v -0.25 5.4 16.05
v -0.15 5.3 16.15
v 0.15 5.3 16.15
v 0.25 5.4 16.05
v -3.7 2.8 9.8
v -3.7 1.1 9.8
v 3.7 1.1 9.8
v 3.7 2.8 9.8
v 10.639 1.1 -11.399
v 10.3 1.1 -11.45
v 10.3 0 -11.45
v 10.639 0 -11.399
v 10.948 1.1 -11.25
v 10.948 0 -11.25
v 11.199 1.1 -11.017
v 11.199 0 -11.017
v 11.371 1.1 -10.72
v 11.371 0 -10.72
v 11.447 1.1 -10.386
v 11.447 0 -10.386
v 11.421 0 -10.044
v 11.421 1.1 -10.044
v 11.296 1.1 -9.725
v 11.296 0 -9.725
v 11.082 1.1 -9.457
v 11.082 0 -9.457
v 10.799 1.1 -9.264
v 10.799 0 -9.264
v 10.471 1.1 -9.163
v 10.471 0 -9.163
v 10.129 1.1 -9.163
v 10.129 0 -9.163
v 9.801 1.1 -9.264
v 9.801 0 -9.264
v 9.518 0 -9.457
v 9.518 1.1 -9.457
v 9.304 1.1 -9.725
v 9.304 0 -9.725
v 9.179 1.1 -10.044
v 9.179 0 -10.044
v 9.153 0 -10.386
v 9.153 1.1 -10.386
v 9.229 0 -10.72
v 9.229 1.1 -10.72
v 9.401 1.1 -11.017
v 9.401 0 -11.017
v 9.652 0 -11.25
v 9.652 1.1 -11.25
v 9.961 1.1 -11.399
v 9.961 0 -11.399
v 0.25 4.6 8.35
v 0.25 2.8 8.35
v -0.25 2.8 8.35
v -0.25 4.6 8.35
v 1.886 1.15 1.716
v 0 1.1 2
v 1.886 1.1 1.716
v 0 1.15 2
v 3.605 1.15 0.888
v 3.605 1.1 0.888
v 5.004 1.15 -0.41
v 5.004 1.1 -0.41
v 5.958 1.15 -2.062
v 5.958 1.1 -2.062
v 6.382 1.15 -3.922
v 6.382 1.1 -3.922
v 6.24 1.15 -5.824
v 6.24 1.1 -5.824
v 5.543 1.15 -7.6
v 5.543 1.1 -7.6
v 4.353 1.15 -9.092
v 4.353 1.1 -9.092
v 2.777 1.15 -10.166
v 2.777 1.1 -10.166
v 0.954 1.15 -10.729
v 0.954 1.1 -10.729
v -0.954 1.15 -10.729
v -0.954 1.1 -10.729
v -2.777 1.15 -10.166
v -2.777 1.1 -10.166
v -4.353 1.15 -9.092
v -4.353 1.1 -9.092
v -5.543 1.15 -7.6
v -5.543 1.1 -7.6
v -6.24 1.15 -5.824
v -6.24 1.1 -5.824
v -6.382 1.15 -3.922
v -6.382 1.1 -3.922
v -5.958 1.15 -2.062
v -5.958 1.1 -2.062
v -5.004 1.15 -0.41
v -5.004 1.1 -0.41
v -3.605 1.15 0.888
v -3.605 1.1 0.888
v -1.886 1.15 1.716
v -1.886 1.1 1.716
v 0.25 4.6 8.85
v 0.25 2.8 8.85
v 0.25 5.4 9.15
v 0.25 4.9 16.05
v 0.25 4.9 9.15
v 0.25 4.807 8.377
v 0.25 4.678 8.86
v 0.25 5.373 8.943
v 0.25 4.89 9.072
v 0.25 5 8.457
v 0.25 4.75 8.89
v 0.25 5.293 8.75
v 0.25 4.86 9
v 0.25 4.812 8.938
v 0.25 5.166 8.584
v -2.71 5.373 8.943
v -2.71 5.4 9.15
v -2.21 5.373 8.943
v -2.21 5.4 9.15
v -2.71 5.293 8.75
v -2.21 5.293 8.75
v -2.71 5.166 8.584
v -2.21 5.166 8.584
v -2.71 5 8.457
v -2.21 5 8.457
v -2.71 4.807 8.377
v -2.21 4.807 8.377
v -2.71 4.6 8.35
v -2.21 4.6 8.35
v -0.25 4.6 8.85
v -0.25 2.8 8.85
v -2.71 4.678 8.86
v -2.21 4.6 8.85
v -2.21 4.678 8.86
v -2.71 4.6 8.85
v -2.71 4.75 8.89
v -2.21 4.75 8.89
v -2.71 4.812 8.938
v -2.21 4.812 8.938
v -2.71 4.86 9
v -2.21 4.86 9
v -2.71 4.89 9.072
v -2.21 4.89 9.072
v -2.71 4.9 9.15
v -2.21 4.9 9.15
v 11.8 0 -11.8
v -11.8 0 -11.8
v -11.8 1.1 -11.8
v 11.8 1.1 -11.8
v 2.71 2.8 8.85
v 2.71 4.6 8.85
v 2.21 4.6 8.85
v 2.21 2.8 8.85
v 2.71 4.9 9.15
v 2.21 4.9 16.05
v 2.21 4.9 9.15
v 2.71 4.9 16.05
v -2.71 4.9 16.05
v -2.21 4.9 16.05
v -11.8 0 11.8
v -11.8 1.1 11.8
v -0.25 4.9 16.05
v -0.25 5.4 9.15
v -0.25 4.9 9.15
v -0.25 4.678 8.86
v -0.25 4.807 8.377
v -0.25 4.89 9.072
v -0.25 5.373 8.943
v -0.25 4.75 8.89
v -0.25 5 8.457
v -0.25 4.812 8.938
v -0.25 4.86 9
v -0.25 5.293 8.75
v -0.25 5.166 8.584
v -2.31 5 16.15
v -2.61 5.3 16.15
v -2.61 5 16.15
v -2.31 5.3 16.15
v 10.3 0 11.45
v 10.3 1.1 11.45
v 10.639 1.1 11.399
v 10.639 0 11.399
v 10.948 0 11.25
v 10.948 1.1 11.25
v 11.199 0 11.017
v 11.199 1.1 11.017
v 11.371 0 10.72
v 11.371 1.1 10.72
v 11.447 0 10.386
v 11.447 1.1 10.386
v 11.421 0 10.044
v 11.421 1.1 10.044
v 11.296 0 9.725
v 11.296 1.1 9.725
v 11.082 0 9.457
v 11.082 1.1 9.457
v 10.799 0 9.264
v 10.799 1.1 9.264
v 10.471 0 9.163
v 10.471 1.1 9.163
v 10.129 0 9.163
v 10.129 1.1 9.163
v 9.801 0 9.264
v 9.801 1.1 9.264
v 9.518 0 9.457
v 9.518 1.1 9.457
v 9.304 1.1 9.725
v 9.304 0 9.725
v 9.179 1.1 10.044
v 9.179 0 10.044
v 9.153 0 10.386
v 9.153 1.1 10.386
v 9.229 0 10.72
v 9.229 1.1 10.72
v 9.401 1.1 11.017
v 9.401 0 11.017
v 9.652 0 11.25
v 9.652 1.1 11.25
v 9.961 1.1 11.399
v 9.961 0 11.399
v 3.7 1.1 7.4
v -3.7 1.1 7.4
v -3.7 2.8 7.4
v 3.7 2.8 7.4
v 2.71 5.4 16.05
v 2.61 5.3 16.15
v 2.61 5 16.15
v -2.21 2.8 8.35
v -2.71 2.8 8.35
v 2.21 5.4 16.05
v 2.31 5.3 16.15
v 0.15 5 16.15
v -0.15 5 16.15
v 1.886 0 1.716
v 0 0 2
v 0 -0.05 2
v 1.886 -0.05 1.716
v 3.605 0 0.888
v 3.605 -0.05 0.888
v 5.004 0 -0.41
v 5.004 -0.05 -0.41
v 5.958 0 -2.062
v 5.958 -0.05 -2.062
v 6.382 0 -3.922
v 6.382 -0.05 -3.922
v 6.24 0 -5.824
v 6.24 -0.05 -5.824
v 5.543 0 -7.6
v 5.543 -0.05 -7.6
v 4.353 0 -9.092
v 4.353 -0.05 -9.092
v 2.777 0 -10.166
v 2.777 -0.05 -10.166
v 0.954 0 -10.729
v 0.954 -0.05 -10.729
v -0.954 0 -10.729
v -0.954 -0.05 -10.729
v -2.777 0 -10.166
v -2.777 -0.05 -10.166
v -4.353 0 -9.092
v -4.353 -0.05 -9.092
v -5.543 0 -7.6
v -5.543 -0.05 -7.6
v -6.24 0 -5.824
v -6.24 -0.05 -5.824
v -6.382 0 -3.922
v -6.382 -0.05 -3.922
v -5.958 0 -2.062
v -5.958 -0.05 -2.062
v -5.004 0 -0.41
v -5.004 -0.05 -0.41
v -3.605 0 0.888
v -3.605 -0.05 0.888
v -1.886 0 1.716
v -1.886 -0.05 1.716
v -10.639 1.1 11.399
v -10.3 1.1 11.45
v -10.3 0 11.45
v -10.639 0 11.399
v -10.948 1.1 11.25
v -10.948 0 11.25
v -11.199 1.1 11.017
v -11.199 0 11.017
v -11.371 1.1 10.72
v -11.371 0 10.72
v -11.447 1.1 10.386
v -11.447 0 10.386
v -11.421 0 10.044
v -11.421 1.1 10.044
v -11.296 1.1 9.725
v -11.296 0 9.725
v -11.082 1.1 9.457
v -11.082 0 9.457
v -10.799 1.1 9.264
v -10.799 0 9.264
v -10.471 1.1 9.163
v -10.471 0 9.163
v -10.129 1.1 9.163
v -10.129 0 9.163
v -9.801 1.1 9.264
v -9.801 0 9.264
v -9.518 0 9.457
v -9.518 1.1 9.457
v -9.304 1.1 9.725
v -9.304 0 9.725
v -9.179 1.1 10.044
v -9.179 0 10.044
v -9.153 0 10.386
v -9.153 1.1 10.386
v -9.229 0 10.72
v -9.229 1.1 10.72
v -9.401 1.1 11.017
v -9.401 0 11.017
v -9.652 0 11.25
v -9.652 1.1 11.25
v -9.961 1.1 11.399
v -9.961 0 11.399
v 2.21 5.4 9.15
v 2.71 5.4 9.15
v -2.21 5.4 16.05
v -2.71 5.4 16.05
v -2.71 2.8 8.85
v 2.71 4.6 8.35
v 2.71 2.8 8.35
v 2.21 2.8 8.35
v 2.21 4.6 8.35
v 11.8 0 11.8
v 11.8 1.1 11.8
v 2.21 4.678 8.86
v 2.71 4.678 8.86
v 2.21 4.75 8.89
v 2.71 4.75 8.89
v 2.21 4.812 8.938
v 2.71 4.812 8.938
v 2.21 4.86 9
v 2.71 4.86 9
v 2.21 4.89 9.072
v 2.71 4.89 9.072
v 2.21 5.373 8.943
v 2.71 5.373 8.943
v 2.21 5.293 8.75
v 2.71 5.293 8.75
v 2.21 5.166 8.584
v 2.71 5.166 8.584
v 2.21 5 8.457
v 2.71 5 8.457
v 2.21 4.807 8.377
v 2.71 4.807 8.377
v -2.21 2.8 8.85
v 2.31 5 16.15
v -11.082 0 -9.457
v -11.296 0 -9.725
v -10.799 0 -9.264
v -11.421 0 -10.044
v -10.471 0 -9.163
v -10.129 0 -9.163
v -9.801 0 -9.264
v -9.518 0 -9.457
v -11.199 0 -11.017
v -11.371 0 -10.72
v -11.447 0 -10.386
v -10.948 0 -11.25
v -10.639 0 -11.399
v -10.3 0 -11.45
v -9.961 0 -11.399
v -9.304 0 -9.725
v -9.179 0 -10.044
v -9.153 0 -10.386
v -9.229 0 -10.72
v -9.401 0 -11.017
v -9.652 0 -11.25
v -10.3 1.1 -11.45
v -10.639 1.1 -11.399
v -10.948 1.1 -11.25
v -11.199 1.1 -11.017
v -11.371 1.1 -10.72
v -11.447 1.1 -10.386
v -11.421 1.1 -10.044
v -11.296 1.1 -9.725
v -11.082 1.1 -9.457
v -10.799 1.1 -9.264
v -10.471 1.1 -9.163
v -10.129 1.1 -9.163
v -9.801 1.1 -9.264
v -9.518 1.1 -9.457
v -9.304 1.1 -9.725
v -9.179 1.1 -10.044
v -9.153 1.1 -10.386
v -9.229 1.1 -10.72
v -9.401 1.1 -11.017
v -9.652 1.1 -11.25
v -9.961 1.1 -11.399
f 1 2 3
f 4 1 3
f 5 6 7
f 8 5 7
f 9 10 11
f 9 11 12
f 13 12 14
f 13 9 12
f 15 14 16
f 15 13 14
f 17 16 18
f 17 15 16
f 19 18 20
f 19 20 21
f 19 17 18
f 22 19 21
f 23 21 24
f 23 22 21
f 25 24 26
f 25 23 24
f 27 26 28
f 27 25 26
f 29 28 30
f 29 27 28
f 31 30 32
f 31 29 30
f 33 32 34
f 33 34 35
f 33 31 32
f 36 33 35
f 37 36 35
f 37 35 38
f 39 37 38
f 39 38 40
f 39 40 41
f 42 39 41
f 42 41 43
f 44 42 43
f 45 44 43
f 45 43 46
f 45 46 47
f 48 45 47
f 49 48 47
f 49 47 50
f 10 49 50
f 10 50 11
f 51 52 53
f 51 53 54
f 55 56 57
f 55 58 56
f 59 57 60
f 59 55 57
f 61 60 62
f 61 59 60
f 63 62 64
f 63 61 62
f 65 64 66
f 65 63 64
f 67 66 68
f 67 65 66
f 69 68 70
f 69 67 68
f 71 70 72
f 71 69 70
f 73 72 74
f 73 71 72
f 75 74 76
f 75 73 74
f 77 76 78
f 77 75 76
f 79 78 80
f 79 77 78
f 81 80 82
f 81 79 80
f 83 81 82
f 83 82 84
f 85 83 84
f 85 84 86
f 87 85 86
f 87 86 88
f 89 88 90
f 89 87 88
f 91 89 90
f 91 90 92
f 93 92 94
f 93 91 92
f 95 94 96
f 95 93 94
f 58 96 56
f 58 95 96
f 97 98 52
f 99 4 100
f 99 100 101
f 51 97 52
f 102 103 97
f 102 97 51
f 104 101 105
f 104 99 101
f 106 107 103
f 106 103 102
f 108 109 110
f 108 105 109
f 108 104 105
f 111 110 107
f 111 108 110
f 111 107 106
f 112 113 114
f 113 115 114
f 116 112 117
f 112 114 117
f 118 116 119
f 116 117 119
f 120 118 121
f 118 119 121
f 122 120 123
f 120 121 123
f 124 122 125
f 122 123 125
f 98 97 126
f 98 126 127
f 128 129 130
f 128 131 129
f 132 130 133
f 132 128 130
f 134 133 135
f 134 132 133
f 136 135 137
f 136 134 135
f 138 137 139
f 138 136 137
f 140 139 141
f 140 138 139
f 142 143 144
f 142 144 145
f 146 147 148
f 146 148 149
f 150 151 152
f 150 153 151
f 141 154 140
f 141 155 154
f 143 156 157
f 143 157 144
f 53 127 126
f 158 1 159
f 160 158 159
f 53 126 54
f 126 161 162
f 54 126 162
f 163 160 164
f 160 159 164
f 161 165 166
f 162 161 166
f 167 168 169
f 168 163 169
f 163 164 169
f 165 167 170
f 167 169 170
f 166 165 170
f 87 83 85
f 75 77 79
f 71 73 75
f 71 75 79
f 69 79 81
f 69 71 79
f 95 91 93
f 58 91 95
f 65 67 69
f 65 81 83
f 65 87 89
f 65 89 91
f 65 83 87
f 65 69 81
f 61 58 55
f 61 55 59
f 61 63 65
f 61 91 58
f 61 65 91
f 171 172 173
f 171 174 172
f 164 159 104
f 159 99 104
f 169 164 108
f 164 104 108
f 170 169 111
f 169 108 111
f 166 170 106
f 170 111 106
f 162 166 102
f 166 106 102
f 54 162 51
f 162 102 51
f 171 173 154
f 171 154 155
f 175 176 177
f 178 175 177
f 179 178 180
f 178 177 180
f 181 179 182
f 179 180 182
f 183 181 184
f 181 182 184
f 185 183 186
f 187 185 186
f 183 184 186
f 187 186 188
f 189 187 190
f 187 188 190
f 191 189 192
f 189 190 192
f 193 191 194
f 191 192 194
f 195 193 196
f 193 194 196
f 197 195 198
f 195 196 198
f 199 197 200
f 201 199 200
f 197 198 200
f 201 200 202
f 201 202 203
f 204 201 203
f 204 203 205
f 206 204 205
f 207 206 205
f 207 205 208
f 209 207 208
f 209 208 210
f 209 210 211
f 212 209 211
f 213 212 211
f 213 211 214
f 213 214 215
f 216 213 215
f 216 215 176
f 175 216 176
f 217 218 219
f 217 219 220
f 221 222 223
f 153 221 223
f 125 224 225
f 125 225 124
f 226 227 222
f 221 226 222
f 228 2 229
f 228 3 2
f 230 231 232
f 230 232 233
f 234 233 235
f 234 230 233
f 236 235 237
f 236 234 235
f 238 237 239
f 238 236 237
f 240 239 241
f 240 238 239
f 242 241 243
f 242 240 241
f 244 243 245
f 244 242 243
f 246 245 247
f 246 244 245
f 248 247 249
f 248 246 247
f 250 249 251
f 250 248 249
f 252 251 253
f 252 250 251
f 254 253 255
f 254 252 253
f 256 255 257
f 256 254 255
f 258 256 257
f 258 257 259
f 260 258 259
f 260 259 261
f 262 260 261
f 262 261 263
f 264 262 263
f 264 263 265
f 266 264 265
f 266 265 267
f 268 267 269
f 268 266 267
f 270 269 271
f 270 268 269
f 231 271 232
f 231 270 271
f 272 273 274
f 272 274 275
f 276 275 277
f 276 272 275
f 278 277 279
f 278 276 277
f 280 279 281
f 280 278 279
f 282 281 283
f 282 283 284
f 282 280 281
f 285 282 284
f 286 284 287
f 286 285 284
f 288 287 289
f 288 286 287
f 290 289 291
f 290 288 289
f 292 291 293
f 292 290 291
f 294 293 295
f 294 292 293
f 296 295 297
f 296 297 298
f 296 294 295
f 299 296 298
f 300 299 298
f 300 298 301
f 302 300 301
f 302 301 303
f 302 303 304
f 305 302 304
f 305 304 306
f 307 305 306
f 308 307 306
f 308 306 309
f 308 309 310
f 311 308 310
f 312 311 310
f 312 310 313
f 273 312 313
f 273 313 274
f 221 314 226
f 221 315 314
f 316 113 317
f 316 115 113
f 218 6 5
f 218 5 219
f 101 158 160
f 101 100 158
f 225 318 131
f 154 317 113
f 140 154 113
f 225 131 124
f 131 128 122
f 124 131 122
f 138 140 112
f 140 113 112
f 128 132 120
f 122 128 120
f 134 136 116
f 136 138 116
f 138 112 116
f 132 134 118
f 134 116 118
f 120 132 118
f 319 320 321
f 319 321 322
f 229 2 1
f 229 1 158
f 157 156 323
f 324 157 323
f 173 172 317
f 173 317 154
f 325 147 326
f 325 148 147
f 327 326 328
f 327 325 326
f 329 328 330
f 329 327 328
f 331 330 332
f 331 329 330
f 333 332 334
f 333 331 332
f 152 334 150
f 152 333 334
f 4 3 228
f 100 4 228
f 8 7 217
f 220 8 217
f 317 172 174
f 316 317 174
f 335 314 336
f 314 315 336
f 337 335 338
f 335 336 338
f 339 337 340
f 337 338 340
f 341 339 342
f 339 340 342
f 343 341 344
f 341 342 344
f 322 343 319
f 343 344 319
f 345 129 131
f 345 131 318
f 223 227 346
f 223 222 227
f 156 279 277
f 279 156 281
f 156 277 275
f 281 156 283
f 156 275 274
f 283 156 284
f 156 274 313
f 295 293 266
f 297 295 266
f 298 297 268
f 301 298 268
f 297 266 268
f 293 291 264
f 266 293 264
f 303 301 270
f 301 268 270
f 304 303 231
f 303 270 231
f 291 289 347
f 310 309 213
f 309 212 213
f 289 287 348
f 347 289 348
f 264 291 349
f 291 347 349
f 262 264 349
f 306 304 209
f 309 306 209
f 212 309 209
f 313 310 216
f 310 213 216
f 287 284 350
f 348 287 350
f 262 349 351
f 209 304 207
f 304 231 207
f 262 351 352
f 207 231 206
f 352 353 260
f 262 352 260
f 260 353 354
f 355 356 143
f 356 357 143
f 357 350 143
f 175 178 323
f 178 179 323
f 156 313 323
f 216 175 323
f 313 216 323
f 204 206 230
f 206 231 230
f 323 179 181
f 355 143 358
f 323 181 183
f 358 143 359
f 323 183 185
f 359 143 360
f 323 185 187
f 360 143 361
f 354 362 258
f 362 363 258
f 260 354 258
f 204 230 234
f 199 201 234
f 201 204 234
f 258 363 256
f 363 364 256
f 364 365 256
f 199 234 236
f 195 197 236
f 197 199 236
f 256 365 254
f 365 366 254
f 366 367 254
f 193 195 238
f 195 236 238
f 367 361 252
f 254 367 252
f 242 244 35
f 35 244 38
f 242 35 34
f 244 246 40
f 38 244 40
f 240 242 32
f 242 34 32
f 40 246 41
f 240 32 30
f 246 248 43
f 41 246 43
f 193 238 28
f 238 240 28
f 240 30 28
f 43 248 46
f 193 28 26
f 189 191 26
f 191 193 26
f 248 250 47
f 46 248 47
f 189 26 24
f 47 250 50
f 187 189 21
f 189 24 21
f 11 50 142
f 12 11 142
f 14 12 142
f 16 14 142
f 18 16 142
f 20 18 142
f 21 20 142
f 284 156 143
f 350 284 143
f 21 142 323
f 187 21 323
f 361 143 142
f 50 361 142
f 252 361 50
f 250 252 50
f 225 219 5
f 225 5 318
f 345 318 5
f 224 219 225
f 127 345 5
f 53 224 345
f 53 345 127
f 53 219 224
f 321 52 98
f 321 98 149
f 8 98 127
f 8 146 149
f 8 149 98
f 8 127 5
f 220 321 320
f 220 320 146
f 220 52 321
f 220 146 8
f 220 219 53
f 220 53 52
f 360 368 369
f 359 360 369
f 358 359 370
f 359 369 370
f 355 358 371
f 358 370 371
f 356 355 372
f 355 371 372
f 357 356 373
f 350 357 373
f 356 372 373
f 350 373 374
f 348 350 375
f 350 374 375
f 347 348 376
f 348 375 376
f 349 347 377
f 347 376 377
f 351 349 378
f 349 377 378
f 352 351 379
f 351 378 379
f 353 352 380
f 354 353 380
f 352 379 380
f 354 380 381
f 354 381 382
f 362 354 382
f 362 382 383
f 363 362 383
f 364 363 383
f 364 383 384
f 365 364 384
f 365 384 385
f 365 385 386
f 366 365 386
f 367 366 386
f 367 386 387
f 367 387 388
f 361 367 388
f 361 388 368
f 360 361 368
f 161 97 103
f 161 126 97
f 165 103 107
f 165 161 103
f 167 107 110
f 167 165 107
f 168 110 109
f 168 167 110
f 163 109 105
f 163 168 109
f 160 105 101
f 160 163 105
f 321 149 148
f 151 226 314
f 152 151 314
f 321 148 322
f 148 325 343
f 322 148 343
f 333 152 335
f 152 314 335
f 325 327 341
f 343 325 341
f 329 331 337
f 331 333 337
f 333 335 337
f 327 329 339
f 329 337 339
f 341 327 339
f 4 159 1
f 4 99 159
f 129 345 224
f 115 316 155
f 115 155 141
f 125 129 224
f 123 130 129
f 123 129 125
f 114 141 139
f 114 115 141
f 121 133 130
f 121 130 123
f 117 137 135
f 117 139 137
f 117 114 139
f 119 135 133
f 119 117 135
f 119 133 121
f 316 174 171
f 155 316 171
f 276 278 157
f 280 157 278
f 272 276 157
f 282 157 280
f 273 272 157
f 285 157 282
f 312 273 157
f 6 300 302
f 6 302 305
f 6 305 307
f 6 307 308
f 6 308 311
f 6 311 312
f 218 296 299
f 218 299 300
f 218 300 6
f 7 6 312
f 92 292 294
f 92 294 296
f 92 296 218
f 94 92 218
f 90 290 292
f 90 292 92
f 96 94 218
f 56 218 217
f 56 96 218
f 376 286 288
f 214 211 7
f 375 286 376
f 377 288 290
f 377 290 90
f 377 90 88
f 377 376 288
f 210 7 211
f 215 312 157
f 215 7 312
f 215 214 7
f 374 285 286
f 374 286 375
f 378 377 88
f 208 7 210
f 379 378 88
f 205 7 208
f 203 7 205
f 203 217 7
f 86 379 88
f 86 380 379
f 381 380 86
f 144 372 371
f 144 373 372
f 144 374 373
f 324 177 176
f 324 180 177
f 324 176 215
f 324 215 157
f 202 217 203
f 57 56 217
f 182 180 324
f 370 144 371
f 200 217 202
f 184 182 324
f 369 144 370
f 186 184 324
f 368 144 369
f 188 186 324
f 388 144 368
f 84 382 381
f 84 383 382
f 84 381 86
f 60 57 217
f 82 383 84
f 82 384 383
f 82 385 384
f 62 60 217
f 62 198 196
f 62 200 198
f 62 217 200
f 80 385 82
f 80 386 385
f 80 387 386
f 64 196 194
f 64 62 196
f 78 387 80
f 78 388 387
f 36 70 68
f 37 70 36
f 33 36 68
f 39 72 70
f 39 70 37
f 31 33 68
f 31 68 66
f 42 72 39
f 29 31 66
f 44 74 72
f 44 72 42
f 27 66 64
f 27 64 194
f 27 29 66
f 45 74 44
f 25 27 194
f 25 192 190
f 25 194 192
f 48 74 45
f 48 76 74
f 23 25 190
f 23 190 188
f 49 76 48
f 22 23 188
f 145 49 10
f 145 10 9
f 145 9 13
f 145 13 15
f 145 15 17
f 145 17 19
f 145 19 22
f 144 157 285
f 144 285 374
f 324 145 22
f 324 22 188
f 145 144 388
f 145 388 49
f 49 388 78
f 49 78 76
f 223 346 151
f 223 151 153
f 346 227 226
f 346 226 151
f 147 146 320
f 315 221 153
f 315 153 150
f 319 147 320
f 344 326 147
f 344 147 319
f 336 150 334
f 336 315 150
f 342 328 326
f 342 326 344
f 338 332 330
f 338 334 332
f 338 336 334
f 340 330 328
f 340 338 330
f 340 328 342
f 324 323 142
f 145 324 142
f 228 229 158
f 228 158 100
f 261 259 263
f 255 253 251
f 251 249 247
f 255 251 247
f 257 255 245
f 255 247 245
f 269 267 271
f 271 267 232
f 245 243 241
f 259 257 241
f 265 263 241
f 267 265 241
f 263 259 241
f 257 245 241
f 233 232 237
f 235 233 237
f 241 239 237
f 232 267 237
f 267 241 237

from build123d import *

# Parameters (mm, degrees)
SKETCH_1_W                         = 23.6
SKETCH_1_H                         = 23.6
EXTRUDE_1_DEPTH                    = 1.1
CUT_EXTRUDE_1_REACH                = 18.724
SKETCH_2_R                         = 1.15
MIRROR_2_COPY_1_REACH              = 18.724
MIRROR_2_COPY_1_SKETCH_R           = 1.15
SKETCH_3_W                         = 7.4
SKETCH_3_H                         = 2.4
EXTRUDE_2_DEPTH                    = 1.7
EXTRUDE_3_DEPTH                    = 0.25
CHAMFER_7_SIZE                     = 0.1
FILLET_1_R                         = 0.3
FILLET_2_R                         = 0.8
PATTERN_LINEAR_2_COUNT             = 2
PATTERN_LINEAR_2_PITCH             = 2.46
CHAMFER_7_OF_PATTERN_LINEAR_2_SIZE = 0.1
FILLET_1_OF_PATTERN_LINEAR_2_R     = 0.3
FILLET_2_OF_PATTERN_LINEAR_2_R     = 0.8
PATTERN_LINEAR_3_COUNT             = 2
PATTERN_LINEAR_3_PITCH             = 2.46
CHAMFER_7_OF_PATTERN_LINEAR_3_SIZE = 0.1
FILLET_1_OF_PATTERN_LINEAR_3_R     = 0.3
FILLET_2_OF_PATTERN_LINEAR_3_R     = 0.8
EXTRUDE_START                      = 0.55
SKETCH_7_R                         = 6.4
EXTRUDE_10_DEPTH                   = 0.6
SKETCH_8_W                         = 8.601343457
SKETCH_8_H                         = 2.116418894
CUT_EXTRUDE_2125_DEPTH             = 1.6


with BuildPart() as part:
    # 草图1 → 凸台-拉伸1 (new body)
    with BuildSketch(Plane(origin=(0, 0, 0), x_dir=(1, 0, 0), z_dir=(0, 1, 0))):
        Rectangle(SKETCH_1_W, SKETCH_1_H)
    extrude(amount=EXTRUDE_1_DEPTH)

    # 草图2 → 切除-拉伸1 (cut, up to next)
    with BuildSketch(Plane(origin=(0, 1.1, 0), x_dir=(1, 0, 0), z_dir=(0, 1, 0)), mode=Mode.PRIVATE) as cut_extrude_1_sk1:
        with Locations(Location((10.3, -10.3, 0), (0, 0, 270))):
            Circle(SKETCH_2_R)
    cut_extrude_1_tool1 = extrude(cut_extrude_1_sk1.sketch, amount=-CUT_EXTRUDE_1_REACH, mode=Mode.PRIVATE) & part.part
    cut_extrude_1 = cut_extrude_1_tool1.solids().sort_by_distance((10.3, 1.1, 10.3))[0]
    add(cut_extrude_1, mode=Mode.SUBTRACT)

    # 镜向1: 切除-拉伸1 across plane
    add(cut_extrude_1.mirror(Plane(origin=(0, 0, 0), x_dir=(0, 0, 1), z_dir=(1, 0, 0))), mode=Mode.SUBTRACT)

    # 镜向2: 切除-拉伸1 across plane
    add(cut_extrude_1.mirror(Plane.XY), mode=Mode.SUBTRACT)

    # 镜向2 copy 1 sketch → 镜向2 copy 1 (cut, up to next)
    with BuildSketch(Plane(origin=(0, 1.1, 0), x_dir=(-1, 0, 0), z_dir=(0, 1, 0)), mode=Mode.PRIVATE) as mirror_2_copy_1_sk1:
        with Locations(Location((10.3, -10.3, 0), (0, 0, 270))):
            Circle(MIRROR_2_COPY_1_SKETCH_R)
    mirror_2_copy_1_tool1 = extrude(mirror_2_copy_1_sk1.sketch, amount=-MIRROR_2_COPY_1_REACH, mode=Mode.PRIVATE) & part.part
    add(mirror_2_copy_1_tool1.solids().sort_by_distance((-10.3, 1.1, -10.3))[0], mode=Mode.SUBTRACT)

    # 草图3 → 凸台-拉伸2 (add)
    with BuildSketch(Plane(origin=(0, 1.1, 0), x_dir=(1, 0, 0), z_dir=(0, 1, 0))):
        with Locations((0, -8.6)):
            Rectangle(SKETCH_3_W, SKETCH_3_H)
    extrude(amount=EXTRUDE_2_DEPTH)

    # 草图4 → 凸台-拉伸3 (add, symmetric)
    with BuildSketch(Plane(origin=(0, 0, 0), x_dir=(0, 0, -1), z_dir=(1, 0, 0))):
        Polygon((-8.35, -1.6), (-8.35, 5.4), (-16.15, 5.4), (-16.15, 4.9), (-8.85, 4.9), (-8.85, -1.6), align=None)
    extrude_3 = extrude(amount=EXTRUDE_3_DEPTH, both=True)

    # 倒角7
    chamfer_7_edges = [part.edges().sort_by_distance(p)[0] for p in [
        (0, -1.6, 8.35),
        (0.25, -1.6, 8.6),
        (-0.25, -1.6, 8.6),
        (0, -1.6, 8.85),
        (-0.25, 5.15, 16.15),
        (0, 5.4, 16.15),
        (0, 4.9, 16.15),
        (0.25, 5.15, 16.15),
    ]]
    chamfer(chamfer_7_edges, length=CHAMFER_7_SIZE)

    # 圆角1
    fillet_1_edges = [part.edges().sort_by_distance(p)[0] for p in [
        (0, 4.9, 8.85),
    ]]
    fillet(fillet_1_edges, radius=FILLET_1_R)

    # 圆角2
    fillet_2_edges = [part.edges().sort_by_distance(p)[0] for p in [
        (0, 5.4, 8.35),
    ]]
    fillet(fillet_2_edges, radius=FILLET_2_R)

    # 阵列(线性)2: 凸台-拉伸3 ×2
    with Locations(*[(i * PATTERN_LINEAR_2_PITCH, 0, 0) for i in range(1, PATTERN_LINEAR_2_COUNT)]):
        add(extrude_3)

    # 倒角7 of 阵列(线性)2
    chamfer_7_of_pattern_linear_2_edges = [part.edges().sort_by_distance(p)[0] for p in [
        (2.46, -1.6, 8.35),
        (2.71, -1.6, 8.6),
        (2.21, -1.6, 8.6),
        (2.46, -1.6, 8.85),
        (2.21, 5.15, 16.15),
        (2.46, 5.4, 16.15),
        (2.46, 4.9, 16.15),
        (2.71, 5.15, 16.15),
    ]]
    chamfer(chamfer_7_of_pattern_linear_2_edges, length=CHAMFER_7_OF_PATTERN_LINEAR_2_SIZE)

    # 圆角1 of 阵列(线性)2
    fillet_1_of_pattern_linear_2_edges = [part.edges().sort_by_distance(p)[0] for p in [
        (2.46, 4.9, 8.85),
    ]]
    fillet(fillet_1_of_pattern_linear_2_edges, radius=FILLET_1_OF_PATTERN_LINEAR_2_R)

    # 圆角2 of 阵列(线性)2
    fillet_2_of_pattern_linear_2_edges = [part.edges().sort_by_distance(p)[0] for p in [
        (2.46, 5.4, 8.35),
    ]]
    fillet(fillet_2_of_pattern_linear_2_edges, radius=FILLET_2_OF_PATTERN_LINEAR_2_R)

    # 阵列(线性)3: 凸台-拉伸3 ×2
    with Locations(*[(-i * PATTERN_LINEAR_3_PITCH, 0, 0) for i in range(1, PATTERN_LINEAR_3_COUNT)]):
        add(extrude_3)

    # 倒角7 of 阵列(线性)3
    chamfer_7_of_pattern_linear_3_edges = [part.edges().sort_by_distance(p)[0] for p in [
        (-2.46, -1.6, 8.35),
        (-2.21, -1.6, 8.6),
        (-2.71, -1.6, 8.6),
        (-2.46, -1.6, 8.85),
        (-2.71, 5.15, 16.15),
        (-2.46, 5.4, 16.15),
        (-2.46, 4.9, 16.15),
        (-2.21, 5.15, 16.15),
    ]]
    chamfer(chamfer_7_of_pattern_linear_3_edges, length=CHAMFER_7_OF_PATTERN_LINEAR_3_SIZE)

    # 圆角1 of 阵列(线性)3
    fillet_1_of_pattern_linear_3_edges = [part.edges().sort_by_distance(p)[0] for p in [
        (-2.46, 4.9, 8.85),
    ]]
    fillet(fillet_1_of_pattern_linear_3_edges, radius=FILLET_1_OF_PATTERN_LINEAR_3_R)

    # 圆角2 of 阵列(线性)3
    fillet_2_of_pattern_linear_3_edges = [part.edges().sort_by_distance(p)[0] for p in [
        (-2.46, 5.4, 8.35),
    ]]
    fillet(fillet_2_of_pattern_linear_3_edges, radius=FILLET_2_OF_PATTERN_LINEAR_3_R)

    # 草图7 → 凸台-拉伸10 (add, symmetric)
    with BuildSketch(Plane(origin=(0, 0, 0), x_dir=(1, 0, 0), z_dir=(0, 1, 0)).offset(EXTRUDE_START)):
        with Locations(Location((0, 4.4, 0), (0, 0, 270))):
            Circle(SKETCH_7_R)
    extrude(amount=EXTRUDE_10_DEPTH, both=True)

    # 草图8 → Cut-Extrude 2125 (cut)
    with BuildSketch(Plane.XZ):
        with Locations((-0.203501817, 8.619224199)):
            Rectangle(SKETCH_8_W, SKETCH_8_H)
    extrude(amount=CUT_EXTRUDE_2125_DEPTH, mode=Mode.SUBTRACT)


solid = part.part
